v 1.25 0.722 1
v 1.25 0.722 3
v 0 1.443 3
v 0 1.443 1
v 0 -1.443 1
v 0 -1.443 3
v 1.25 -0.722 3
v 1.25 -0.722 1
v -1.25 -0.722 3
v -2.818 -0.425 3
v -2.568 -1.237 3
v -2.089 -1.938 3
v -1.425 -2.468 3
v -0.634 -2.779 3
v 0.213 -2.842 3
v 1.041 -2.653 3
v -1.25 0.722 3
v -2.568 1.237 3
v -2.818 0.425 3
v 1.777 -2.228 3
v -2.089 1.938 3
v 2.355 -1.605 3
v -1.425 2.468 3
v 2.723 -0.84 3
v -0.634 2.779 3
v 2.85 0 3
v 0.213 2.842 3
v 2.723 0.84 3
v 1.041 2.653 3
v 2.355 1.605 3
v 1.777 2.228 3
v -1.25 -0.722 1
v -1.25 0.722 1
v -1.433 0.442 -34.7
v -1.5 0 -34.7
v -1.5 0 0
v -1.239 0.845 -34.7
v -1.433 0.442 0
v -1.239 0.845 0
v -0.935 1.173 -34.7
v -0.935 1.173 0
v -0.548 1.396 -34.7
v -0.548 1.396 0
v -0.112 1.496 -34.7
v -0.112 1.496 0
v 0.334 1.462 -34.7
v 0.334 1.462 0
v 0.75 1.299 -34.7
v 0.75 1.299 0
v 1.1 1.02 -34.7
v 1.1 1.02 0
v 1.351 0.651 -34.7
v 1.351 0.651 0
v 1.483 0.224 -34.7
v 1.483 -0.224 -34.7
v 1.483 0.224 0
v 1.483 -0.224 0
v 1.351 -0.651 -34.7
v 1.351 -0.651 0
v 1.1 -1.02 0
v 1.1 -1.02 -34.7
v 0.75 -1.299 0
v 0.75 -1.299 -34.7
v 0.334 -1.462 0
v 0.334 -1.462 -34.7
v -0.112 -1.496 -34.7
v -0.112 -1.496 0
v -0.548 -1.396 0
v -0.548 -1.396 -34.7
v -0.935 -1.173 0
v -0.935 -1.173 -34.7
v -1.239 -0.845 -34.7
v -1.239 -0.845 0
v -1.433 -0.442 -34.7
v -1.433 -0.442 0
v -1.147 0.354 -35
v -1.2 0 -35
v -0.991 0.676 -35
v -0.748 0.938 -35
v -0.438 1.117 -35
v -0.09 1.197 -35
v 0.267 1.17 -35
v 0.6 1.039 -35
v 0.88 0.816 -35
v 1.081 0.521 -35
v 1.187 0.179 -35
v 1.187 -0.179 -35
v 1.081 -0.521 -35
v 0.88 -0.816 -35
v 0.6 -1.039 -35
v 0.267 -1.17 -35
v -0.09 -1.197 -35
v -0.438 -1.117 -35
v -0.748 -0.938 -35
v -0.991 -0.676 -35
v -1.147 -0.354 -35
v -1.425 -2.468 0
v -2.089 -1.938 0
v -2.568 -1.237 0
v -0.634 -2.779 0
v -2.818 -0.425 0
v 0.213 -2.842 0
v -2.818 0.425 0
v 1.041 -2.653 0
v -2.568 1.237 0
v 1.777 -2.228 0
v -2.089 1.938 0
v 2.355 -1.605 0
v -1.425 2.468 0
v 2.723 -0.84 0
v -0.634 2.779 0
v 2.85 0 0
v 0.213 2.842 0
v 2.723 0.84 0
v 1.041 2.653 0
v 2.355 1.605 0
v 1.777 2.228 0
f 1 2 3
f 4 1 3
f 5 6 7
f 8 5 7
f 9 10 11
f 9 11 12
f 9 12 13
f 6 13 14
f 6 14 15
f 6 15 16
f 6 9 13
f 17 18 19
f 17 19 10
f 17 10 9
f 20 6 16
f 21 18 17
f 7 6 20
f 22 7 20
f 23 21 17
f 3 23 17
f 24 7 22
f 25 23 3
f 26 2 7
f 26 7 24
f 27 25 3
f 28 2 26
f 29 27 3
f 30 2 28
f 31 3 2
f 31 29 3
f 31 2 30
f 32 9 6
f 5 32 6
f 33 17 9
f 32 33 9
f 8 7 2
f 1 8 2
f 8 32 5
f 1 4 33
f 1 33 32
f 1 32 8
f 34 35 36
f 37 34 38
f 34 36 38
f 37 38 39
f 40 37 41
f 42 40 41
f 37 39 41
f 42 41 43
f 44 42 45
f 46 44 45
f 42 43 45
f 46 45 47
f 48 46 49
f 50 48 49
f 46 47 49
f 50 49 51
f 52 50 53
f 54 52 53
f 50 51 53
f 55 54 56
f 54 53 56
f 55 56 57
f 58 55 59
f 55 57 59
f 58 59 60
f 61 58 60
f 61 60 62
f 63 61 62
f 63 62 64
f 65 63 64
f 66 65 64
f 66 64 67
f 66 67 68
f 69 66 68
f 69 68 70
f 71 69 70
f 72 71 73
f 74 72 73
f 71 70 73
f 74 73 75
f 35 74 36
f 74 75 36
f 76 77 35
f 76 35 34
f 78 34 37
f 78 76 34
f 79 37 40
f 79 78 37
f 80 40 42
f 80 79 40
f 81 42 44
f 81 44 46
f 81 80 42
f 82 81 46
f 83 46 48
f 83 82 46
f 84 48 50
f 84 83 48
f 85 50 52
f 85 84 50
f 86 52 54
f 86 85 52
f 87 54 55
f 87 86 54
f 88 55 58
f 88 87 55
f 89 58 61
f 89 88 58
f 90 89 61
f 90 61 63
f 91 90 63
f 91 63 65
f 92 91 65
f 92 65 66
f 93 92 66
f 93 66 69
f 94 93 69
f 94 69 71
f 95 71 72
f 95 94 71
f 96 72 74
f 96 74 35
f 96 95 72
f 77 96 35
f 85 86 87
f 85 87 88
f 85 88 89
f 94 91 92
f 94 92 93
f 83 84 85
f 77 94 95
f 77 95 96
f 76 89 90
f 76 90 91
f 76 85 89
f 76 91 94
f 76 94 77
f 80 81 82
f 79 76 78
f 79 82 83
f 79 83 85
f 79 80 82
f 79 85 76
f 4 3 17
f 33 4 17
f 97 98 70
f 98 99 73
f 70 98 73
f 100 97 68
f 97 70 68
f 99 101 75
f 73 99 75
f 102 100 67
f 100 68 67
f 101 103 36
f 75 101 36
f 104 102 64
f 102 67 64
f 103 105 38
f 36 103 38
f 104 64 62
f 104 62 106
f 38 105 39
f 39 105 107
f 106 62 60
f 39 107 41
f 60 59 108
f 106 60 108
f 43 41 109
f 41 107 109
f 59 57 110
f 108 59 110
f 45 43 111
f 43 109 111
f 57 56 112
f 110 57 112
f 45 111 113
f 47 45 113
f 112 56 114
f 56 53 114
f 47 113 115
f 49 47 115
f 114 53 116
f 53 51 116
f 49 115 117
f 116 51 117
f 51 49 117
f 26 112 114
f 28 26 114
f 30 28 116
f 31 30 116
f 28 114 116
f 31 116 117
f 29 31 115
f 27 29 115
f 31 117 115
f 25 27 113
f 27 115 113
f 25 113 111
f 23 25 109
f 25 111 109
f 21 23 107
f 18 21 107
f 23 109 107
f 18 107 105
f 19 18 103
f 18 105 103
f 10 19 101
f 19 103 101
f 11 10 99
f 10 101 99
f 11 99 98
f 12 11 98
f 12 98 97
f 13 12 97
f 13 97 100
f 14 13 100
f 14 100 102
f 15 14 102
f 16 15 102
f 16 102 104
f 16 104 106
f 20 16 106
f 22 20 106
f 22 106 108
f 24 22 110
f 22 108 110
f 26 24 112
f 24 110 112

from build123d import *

# Parameters (mm, degrees)
SKETCH1_R           = 2.85
BOSS_EXTRUDE1_DEPTH = 3
SKETCH2_R           = 1.5
BOSS_EXTRUDE2_DEPTH = 35
CHAMFER1_SIZE       = 0.3
CUT_EXTRUDE1_DEPTH  = 2


with BuildPart() as part:
    # Sketch1 → Boss-Extrude1 (new body)
    with BuildSketch(Plane.XY):
        Circle(SKETCH1_R)
    extrude(amount=BOSS_EXTRUDE1_DEPTH)

    # Sketch2 → Boss-Extrude2 (add)
    with BuildSketch(Plane(origin=(0, 0, 0), x_dir=(-1, 0, 0), z_dir=(0, 0, -1))):
        Circle(SKETCH2_R)
    extrude(amount=BOSS_EXTRUDE2_DEPTH)

    # Chamfer1
    chamfer1_edges = [part.edges().sort_by_distance(p)[0] for p in [
        (1.5, 0, -35),
    ]]
    chamfer(chamfer1_edges, length=CHAMFER1_SIZE)

    # Sketch3 → Cut-Extrude1 (cut)
    with BuildSketch(Plane.XY.offset(3)):
        Polygon((0, 1.443375673), (-1.25, 0.721687836), (-1.25, -0.721687836), (0, -1.443375673), (1.25, -0.721687836), (1.25, 0.721687836), align=None)
    extrude(amount=-CUT_EXTRUDE1_DEPTH, mode=Mode.SUBTRACT)


solid = part.part
